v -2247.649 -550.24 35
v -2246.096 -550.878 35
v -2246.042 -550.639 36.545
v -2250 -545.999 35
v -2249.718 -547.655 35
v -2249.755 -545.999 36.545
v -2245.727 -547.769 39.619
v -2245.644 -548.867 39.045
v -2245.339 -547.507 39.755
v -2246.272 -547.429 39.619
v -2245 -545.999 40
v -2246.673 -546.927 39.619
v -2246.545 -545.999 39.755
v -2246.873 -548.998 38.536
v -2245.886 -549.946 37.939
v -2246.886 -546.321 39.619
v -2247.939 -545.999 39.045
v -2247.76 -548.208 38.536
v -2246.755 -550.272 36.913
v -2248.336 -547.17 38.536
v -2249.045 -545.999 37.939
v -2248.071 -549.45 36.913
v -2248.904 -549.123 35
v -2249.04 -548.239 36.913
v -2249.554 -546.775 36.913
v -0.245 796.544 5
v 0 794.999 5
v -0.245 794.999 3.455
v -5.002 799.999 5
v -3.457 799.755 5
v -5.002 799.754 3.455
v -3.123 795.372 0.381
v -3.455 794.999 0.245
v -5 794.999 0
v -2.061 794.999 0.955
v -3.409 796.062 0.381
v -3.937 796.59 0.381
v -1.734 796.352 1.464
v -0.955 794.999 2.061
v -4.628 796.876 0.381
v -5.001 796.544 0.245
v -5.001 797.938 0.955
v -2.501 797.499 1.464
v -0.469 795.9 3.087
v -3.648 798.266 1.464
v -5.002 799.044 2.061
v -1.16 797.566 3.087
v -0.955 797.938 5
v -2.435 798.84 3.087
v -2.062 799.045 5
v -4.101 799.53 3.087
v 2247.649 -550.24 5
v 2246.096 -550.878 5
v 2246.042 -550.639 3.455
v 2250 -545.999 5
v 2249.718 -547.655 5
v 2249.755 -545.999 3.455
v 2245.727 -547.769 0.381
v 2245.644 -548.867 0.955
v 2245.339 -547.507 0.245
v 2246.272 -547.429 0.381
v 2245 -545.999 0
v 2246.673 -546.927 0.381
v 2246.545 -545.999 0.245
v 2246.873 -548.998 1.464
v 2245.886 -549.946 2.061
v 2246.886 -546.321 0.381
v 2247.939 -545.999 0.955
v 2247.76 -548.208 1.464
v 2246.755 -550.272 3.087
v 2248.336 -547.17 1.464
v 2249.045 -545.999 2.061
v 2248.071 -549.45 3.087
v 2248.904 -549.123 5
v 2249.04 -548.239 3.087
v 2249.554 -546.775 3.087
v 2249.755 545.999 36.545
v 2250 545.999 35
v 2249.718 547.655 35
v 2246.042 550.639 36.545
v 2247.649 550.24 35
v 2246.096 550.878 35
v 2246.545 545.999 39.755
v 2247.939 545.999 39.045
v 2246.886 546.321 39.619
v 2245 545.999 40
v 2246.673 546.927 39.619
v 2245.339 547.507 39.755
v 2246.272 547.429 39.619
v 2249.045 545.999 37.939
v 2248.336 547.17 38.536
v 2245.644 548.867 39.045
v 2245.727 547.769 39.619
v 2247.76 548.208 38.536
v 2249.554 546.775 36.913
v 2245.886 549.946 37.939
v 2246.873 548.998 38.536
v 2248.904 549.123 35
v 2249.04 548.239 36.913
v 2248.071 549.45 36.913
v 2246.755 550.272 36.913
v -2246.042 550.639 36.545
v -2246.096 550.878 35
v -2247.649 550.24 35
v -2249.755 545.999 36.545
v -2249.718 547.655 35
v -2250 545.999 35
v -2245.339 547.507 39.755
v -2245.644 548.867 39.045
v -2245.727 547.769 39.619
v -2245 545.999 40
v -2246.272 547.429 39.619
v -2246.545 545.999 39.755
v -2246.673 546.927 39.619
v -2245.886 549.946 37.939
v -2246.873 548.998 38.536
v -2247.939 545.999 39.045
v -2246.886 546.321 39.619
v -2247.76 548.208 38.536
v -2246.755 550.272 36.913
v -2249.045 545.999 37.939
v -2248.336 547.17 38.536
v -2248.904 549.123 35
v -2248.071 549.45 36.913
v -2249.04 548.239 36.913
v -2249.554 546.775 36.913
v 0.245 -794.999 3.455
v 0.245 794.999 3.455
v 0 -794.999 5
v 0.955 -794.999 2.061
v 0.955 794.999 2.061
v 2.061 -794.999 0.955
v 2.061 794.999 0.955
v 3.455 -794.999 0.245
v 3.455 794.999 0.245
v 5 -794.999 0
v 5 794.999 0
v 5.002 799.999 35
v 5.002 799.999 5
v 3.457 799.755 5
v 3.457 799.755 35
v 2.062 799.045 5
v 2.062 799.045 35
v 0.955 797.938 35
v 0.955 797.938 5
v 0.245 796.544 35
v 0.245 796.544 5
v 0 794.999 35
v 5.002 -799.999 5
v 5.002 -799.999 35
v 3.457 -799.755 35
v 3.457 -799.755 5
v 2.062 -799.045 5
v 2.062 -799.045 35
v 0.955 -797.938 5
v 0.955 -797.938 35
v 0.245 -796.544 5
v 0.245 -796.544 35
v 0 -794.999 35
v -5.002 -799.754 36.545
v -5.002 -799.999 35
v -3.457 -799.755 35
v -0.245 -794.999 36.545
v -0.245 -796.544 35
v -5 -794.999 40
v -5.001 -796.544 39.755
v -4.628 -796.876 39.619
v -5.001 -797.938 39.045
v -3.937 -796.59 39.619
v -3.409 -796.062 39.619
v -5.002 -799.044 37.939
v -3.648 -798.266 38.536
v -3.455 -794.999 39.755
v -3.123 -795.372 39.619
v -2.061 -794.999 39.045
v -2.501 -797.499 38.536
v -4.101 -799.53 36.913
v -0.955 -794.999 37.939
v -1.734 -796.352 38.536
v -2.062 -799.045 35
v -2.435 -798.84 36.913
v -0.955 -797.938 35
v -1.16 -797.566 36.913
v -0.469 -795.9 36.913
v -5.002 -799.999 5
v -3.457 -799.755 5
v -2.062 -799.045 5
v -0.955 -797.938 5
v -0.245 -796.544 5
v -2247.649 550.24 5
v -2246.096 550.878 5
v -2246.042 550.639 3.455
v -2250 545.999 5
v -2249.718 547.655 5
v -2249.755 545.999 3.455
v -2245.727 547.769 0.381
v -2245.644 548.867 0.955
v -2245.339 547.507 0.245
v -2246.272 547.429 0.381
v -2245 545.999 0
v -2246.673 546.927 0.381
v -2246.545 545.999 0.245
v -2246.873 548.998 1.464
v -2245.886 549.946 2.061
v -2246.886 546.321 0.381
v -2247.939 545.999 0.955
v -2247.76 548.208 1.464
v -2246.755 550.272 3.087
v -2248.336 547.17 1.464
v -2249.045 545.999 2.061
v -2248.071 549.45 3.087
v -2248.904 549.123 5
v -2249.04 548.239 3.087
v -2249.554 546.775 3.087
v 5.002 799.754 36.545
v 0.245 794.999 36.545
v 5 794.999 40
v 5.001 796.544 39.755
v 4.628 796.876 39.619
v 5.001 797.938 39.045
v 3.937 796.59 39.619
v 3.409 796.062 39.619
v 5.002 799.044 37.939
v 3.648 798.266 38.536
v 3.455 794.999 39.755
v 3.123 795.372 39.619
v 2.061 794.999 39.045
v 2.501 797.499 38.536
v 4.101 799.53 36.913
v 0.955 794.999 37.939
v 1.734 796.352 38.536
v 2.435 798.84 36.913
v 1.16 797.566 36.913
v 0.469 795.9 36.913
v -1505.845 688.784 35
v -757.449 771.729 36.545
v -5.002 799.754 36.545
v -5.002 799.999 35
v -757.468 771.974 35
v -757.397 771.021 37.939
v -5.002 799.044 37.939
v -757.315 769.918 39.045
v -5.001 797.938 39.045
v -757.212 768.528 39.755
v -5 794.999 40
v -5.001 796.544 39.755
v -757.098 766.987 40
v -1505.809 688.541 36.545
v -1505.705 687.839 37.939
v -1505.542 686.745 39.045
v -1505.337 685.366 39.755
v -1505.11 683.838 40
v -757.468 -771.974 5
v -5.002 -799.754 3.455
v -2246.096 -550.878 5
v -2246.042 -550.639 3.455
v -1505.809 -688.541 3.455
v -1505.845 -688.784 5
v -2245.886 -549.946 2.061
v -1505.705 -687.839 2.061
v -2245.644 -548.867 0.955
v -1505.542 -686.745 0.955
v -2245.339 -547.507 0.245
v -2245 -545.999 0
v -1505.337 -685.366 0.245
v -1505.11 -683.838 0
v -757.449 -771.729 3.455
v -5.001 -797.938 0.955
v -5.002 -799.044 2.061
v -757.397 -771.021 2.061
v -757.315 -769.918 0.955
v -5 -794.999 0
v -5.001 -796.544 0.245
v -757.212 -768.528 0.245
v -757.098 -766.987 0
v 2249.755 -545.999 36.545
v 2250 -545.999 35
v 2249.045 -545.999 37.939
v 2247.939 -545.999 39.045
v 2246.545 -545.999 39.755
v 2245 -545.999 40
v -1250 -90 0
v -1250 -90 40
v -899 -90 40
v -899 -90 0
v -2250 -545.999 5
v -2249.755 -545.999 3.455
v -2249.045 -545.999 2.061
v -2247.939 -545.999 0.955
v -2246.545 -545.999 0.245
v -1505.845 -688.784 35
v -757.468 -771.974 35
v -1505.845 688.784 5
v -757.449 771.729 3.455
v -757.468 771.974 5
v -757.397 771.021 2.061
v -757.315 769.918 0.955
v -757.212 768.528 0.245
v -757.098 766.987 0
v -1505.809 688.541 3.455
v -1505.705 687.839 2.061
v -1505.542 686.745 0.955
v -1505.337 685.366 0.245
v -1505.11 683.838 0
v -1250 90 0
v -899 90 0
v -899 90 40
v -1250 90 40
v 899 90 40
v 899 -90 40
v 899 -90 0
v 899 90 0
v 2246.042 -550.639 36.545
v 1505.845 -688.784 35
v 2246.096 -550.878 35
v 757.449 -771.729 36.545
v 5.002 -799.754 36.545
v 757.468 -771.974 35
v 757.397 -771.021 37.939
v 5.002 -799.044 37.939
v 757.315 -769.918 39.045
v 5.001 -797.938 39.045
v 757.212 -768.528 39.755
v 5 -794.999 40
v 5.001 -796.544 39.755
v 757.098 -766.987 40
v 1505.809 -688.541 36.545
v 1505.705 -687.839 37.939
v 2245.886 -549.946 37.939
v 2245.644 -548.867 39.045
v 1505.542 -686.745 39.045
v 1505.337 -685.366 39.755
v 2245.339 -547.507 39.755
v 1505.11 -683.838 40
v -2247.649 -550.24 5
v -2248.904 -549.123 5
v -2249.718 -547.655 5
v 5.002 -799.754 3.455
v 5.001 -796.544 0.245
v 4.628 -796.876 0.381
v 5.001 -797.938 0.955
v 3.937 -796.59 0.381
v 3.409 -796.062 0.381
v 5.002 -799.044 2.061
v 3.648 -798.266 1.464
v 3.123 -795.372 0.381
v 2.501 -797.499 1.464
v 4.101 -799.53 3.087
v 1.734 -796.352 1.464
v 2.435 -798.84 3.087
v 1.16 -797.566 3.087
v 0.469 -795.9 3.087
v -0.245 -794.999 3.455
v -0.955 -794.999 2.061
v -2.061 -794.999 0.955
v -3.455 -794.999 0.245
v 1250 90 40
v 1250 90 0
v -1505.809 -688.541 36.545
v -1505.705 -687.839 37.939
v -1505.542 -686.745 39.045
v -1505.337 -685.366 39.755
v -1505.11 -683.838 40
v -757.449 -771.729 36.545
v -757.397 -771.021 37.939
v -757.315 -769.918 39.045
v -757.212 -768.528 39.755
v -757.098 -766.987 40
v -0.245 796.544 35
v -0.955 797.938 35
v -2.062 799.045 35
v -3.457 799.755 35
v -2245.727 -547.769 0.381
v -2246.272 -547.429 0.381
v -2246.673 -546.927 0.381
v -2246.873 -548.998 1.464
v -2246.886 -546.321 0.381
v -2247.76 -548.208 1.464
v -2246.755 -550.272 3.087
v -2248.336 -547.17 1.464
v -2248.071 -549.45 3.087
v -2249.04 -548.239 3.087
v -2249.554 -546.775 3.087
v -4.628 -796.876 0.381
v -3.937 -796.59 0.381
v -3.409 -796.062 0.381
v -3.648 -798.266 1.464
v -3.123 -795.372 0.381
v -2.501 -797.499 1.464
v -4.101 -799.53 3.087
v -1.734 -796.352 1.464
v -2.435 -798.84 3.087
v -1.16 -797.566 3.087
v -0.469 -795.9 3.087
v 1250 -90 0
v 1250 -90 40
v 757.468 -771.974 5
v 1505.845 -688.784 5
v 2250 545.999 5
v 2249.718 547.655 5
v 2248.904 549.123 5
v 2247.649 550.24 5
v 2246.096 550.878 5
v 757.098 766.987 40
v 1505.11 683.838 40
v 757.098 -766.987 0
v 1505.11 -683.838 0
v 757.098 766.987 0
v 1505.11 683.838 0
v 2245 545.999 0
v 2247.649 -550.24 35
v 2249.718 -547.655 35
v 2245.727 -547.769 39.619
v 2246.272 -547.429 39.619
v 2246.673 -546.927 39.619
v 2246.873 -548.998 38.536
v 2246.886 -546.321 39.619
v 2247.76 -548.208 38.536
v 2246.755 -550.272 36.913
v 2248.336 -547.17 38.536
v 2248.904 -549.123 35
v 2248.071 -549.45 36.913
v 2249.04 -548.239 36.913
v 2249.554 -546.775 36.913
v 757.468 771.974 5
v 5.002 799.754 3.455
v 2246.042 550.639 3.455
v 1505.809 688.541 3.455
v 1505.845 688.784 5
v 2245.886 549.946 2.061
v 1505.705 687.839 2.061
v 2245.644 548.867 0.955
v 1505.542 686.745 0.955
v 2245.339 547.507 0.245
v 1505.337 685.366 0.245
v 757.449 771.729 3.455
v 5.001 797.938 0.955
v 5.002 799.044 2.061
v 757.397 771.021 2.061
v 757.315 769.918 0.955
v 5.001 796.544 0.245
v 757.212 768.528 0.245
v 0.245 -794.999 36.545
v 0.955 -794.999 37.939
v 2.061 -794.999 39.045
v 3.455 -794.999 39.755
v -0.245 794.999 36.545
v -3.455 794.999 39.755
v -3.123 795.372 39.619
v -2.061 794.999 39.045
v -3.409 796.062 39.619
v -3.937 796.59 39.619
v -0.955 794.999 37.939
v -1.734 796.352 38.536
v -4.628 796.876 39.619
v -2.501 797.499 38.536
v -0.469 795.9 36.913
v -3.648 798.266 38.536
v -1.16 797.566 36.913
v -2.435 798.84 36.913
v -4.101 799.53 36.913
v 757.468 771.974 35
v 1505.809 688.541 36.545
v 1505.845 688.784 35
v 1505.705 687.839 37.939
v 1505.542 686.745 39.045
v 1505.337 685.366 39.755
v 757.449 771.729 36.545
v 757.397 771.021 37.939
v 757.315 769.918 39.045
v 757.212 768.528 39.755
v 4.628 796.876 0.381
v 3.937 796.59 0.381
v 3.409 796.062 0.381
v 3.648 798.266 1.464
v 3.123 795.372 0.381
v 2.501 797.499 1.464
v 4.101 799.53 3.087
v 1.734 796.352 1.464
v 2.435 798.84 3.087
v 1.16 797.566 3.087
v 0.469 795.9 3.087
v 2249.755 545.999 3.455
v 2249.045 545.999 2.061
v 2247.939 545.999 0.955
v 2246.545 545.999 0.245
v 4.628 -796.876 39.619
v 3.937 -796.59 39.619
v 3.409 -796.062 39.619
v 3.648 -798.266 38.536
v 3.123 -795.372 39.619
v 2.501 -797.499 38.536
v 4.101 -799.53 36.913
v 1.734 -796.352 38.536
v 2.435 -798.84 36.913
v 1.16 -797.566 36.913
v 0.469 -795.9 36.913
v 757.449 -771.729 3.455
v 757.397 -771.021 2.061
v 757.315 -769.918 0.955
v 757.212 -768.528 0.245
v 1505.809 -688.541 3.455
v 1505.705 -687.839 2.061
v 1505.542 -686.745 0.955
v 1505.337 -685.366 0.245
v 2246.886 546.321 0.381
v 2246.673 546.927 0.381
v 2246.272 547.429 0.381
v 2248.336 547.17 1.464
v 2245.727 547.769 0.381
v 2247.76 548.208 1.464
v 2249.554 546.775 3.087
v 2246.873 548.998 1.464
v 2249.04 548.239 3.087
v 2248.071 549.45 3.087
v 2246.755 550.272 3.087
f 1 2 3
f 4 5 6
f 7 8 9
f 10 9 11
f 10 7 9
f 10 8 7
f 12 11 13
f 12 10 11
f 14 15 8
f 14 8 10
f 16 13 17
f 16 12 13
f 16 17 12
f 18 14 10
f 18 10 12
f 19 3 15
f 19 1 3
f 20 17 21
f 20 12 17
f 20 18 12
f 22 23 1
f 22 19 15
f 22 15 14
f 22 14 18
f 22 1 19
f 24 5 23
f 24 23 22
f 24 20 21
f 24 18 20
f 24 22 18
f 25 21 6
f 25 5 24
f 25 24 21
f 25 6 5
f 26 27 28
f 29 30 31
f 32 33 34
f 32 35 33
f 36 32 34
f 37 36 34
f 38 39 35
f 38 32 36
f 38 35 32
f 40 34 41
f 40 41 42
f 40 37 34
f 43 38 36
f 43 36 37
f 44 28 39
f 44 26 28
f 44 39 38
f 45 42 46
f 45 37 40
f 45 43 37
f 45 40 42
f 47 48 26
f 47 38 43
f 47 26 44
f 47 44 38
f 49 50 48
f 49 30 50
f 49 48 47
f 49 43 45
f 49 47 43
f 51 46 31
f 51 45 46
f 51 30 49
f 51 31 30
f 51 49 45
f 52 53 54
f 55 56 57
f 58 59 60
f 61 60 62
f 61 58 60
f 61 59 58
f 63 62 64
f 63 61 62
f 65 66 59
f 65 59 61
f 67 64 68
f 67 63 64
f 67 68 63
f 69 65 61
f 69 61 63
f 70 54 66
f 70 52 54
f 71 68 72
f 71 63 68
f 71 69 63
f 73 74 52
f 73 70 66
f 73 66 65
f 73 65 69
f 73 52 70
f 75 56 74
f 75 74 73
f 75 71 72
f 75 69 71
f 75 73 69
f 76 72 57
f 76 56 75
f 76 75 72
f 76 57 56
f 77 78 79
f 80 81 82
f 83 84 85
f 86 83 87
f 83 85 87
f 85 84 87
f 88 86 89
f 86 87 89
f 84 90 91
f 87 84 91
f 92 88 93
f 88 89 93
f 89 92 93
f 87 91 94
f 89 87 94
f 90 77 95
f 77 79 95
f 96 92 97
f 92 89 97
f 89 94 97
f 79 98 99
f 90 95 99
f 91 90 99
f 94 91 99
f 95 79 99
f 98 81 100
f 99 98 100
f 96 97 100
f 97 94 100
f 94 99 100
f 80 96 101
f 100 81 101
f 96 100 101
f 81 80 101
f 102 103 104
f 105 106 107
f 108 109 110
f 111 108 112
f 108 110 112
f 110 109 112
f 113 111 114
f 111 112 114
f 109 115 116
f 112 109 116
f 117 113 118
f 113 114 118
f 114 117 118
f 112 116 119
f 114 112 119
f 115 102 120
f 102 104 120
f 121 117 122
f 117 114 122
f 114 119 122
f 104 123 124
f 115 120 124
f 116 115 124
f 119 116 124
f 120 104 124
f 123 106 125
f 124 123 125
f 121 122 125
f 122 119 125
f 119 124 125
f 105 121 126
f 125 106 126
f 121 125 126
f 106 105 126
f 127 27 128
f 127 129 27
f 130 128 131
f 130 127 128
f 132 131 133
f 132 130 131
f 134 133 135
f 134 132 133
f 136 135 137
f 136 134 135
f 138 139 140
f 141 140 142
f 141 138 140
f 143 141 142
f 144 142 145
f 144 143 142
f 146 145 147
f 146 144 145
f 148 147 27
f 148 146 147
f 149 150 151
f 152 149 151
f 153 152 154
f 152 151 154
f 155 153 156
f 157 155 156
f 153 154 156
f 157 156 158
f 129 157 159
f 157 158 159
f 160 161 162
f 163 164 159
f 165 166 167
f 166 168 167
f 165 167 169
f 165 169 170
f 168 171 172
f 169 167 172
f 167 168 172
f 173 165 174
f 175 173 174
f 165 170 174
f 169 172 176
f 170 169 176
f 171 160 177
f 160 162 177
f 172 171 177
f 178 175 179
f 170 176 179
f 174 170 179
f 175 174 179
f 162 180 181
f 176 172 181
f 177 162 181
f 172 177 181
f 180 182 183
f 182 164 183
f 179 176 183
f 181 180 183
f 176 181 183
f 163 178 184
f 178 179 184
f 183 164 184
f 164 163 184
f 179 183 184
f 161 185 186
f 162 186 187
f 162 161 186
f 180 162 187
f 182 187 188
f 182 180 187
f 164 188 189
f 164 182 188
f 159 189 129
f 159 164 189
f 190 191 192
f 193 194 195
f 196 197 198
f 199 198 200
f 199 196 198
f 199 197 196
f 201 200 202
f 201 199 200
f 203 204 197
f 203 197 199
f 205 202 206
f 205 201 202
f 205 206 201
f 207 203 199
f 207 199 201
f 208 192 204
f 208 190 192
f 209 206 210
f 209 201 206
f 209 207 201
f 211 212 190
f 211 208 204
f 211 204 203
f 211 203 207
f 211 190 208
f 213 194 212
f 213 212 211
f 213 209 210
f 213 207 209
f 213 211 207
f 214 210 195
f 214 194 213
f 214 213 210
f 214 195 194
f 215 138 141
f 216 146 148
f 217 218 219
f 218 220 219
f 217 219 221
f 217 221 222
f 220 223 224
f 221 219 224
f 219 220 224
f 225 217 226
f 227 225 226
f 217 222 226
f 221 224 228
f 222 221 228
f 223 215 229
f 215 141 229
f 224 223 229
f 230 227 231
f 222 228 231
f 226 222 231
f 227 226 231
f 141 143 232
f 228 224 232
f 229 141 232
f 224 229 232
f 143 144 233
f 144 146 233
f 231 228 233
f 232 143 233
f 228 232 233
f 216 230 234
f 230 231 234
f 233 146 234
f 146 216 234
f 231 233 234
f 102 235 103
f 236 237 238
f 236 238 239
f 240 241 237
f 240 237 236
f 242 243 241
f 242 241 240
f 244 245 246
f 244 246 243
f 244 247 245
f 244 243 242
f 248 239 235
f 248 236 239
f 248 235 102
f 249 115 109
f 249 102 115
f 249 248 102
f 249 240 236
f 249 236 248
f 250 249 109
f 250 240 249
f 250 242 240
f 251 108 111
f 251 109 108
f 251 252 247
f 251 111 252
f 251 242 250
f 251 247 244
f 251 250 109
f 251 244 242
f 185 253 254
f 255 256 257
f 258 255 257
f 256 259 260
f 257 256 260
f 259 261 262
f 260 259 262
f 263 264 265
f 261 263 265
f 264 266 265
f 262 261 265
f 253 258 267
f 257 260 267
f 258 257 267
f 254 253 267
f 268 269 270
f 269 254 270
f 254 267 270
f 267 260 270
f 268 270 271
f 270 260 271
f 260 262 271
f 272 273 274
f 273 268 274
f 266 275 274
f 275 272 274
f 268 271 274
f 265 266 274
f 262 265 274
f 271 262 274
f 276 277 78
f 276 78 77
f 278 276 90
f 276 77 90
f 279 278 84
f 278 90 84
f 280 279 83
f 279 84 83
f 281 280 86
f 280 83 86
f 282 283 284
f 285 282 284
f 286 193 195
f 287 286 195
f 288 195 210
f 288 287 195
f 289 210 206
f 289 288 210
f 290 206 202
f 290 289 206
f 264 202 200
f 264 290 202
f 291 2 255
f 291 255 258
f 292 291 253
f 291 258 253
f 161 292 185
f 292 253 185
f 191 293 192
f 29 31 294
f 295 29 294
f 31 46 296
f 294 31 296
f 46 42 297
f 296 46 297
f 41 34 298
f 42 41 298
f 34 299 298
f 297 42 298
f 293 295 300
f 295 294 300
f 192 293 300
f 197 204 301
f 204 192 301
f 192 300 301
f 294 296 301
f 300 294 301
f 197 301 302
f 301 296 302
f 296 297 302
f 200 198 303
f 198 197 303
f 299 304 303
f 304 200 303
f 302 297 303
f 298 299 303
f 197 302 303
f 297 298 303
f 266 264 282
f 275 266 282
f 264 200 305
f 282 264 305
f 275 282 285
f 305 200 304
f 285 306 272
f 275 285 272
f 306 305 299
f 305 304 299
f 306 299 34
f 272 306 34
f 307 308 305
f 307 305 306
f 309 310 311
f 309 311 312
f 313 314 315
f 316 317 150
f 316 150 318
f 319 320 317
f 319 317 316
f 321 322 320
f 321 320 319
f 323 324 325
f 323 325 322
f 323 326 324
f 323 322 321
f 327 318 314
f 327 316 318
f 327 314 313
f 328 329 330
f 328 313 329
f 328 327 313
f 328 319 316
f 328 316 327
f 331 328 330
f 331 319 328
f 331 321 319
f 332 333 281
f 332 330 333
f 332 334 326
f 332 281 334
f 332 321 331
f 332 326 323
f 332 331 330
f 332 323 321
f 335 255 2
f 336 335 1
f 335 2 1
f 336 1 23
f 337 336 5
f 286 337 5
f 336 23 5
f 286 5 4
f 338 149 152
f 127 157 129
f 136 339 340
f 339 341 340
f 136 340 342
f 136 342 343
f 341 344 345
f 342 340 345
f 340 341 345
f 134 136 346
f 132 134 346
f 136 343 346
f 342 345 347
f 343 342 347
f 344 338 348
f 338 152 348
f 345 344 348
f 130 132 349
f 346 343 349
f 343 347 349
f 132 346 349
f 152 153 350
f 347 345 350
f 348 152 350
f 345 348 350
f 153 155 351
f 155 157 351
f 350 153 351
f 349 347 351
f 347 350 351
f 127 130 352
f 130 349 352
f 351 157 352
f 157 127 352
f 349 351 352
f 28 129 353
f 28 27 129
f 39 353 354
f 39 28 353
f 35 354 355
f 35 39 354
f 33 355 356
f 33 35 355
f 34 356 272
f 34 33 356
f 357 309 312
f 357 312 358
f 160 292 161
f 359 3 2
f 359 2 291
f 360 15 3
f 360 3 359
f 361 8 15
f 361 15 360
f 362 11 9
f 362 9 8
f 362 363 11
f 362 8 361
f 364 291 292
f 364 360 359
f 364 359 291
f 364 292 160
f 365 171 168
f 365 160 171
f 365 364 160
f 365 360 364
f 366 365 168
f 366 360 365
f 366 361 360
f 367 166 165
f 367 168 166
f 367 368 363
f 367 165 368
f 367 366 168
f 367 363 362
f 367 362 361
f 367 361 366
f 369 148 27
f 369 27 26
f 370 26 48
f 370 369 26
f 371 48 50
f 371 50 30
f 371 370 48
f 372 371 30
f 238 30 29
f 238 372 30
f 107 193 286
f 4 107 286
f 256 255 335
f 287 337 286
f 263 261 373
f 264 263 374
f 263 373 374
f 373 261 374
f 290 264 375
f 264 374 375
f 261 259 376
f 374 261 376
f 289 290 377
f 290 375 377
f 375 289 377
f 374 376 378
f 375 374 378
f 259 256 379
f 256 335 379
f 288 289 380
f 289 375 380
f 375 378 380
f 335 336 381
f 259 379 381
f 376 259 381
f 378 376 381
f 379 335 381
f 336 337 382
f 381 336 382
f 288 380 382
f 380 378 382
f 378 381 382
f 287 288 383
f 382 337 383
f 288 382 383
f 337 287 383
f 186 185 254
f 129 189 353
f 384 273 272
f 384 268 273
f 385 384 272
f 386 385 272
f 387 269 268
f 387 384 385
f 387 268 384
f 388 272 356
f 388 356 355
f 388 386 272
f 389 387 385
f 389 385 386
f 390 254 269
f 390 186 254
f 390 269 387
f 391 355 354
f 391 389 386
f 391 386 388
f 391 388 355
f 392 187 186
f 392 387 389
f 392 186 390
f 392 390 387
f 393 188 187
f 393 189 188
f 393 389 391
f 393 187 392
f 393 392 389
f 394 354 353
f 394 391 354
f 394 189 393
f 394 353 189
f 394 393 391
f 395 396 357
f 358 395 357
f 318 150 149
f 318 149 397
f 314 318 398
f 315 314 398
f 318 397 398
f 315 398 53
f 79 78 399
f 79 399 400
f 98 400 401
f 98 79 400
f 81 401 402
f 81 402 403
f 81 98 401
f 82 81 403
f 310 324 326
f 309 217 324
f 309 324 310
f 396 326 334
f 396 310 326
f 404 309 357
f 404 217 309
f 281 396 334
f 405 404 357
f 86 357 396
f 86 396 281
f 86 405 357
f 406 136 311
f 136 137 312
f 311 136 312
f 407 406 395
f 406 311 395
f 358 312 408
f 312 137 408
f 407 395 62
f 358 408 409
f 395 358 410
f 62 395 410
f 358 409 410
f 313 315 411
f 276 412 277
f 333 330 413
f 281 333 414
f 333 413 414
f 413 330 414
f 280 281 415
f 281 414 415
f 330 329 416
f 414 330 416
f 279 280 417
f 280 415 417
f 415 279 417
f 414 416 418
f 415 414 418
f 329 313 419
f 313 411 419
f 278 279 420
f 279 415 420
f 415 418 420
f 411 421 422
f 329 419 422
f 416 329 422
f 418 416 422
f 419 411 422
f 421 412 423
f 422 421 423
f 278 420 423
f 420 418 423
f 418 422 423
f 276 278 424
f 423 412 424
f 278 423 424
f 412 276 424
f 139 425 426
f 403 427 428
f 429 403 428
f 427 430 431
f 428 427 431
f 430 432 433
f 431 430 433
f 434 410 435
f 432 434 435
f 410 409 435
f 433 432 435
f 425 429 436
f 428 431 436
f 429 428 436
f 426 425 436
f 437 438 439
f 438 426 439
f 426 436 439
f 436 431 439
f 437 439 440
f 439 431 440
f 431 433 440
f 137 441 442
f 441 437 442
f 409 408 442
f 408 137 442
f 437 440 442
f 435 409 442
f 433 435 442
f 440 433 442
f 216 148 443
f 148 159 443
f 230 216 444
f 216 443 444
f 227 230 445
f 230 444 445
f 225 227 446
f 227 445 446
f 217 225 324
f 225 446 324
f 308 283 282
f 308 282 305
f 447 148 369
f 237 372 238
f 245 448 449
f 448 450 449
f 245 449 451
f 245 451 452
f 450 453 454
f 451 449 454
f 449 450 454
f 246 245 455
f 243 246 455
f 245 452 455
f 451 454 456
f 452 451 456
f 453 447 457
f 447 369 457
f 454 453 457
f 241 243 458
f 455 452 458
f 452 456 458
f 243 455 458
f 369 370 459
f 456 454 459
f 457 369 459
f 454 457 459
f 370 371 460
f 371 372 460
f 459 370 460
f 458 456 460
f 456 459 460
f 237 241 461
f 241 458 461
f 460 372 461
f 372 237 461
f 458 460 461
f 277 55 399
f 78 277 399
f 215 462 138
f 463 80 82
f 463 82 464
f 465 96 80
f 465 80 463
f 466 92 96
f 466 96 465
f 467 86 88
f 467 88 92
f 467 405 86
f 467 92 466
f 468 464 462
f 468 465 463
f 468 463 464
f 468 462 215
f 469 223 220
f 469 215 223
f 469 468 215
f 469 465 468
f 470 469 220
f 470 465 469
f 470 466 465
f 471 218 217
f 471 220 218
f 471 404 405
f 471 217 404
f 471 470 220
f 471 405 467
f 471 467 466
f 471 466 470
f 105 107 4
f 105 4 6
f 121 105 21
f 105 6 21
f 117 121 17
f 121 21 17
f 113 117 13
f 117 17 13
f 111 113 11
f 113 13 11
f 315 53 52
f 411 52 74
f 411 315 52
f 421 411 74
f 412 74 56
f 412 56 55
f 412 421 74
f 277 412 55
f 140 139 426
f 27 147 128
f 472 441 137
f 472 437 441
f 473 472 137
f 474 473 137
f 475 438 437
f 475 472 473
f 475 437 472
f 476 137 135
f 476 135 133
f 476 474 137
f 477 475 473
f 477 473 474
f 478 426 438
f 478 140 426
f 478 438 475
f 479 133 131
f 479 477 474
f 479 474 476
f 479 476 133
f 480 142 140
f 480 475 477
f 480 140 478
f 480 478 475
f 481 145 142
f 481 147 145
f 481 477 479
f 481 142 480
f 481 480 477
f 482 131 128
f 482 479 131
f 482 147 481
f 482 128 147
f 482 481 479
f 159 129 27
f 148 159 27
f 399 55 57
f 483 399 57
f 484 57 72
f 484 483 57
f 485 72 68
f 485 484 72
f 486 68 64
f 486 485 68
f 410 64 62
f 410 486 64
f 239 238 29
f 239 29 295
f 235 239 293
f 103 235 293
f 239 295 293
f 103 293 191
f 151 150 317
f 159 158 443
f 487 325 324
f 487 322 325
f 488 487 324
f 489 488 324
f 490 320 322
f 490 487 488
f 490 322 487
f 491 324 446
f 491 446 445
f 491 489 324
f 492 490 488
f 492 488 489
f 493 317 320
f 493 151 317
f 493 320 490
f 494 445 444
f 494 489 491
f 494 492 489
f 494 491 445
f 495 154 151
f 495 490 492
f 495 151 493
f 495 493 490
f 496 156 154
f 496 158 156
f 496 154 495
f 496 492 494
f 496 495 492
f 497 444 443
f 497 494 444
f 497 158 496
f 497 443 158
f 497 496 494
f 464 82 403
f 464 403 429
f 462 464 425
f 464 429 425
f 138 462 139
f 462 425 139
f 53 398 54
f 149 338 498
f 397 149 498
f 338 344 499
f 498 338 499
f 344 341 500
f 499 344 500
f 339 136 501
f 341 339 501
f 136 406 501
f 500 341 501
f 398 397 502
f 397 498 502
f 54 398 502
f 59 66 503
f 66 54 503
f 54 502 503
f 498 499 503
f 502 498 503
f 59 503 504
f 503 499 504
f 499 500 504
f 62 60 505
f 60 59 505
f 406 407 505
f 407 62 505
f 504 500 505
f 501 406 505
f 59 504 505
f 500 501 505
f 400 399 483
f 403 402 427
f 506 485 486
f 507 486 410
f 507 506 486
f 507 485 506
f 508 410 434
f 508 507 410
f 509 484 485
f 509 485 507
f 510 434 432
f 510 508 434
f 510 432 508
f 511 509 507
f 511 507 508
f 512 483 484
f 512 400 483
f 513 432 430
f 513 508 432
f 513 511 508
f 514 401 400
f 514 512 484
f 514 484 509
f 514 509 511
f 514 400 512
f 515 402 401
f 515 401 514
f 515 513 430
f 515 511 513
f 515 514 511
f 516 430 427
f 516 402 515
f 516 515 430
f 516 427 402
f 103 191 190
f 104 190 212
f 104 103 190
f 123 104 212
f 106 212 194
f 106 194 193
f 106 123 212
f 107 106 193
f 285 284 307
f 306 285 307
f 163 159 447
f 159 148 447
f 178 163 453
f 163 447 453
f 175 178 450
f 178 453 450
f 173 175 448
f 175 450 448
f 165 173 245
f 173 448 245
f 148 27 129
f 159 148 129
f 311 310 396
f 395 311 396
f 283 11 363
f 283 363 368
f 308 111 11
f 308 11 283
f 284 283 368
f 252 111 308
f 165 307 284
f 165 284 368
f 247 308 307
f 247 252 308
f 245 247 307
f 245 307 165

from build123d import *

# Parameters (mm, degrees)
F1_DEPTH = 40
F2_DEPTH = 40
F3_R     = 5
F4_R     = 5
F5_W     = 351
F5_H     = 180
F6_DEPTH = 40
F7_W     = 351
F7_H     = 180
F8_DEPTH = 40.0010001


with BuildPart() as f1:
    # F0 (on Top) → F1 (new body)
    with BuildSketch(Plane.XY):
        with BuildLine():
            ThreePointArc((0, -800), (1131.9231422672, -737.3082804046), (2250, -550))
            Line((2250, -550), (2250, 550))
            ThreePointArc((2250, 550), (1131.9231422672, 737.3082804046), (0, 800))
            Line((0, 800), (0, -800))
        make_face()
    extrude(amount=F1_DEPTH)

    # F3
    f3_edges = [f1.edges().sort_by_distance(p)[0] for p in [
        (2250, -550, 20),
        (2250, 550, 20),
        (0, -800, 20),
        (0, 800, 20),
        (1131.923142, -737.30828, 40),
        (2250, 0, 40),
        (1131.923142, 737.30828, 40),
        (0, 0, 40),
        (1131.923142, -737.30828, 0),
        (2250, 0, 0),
        (1131.923142, 737.30828, 0),
        (0, 0, 0),
    ]]
    fillet(f3_edges, radius=F3_R)

    # F5 (on face) → F6 (cut)
    with BuildSketch(Plane.XY.offset(40)):
        with Locations((1074.5, 0)):
            Rectangle(F5_W, F5_H)
    extrude(amount=-F6_DEPTH, mode=Mode.SUBTRACT)


with BuildPart() as f2:
    # F0 (on Top) → F2 (new body)
    with BuildSketch(Plane.XY):
        with BuildLine():
            ThreePointArc((-2250, -550), (-1131.9231422672, -737.3082804046), (0, -800))
            Line((0, -800), (0, 800))
            ThreePointArc((0, 800), (-1131.9231422672, 737.3082804046), (-2250, 550))
            Line((-2250, 550), (-2250, -550))
        make_face()
    extrude(amount=F2_DEPTH)

    # F4
    f4_edges = [f2.edges().sort_by_distance(p)[0] for p in [
        (0, -800, 20),
        (-2250, -550, 20),
        (-2250, 550, 20),
        (0, 800, 20),
        (-1131.923142, -737.30828, 40),
        (0, 0, 40),
        (-1131.923142, 737.30828, 40),
        (-2250, 0, 40),
        (-1131.923142, -737.30828, 0),
        (0, 0, 0),
        (-1131.923142, 737.30828, 0),
        (-2250, 0, 0),
    ]]
    fillet(f4_edges, radius=F4_R)

    # F7 (on face) → F8 (cut, through all)
    with BuildSketch(Plane.XY.offset(40)):
        with Locations((-1074.5, 0)):
            Rectangle(F7_W, F7_H)
    extrude(amount=-F8_DEPTH, mode=Mode.SUBTRACT)


solid = Compound([f1.part, f2.part])
